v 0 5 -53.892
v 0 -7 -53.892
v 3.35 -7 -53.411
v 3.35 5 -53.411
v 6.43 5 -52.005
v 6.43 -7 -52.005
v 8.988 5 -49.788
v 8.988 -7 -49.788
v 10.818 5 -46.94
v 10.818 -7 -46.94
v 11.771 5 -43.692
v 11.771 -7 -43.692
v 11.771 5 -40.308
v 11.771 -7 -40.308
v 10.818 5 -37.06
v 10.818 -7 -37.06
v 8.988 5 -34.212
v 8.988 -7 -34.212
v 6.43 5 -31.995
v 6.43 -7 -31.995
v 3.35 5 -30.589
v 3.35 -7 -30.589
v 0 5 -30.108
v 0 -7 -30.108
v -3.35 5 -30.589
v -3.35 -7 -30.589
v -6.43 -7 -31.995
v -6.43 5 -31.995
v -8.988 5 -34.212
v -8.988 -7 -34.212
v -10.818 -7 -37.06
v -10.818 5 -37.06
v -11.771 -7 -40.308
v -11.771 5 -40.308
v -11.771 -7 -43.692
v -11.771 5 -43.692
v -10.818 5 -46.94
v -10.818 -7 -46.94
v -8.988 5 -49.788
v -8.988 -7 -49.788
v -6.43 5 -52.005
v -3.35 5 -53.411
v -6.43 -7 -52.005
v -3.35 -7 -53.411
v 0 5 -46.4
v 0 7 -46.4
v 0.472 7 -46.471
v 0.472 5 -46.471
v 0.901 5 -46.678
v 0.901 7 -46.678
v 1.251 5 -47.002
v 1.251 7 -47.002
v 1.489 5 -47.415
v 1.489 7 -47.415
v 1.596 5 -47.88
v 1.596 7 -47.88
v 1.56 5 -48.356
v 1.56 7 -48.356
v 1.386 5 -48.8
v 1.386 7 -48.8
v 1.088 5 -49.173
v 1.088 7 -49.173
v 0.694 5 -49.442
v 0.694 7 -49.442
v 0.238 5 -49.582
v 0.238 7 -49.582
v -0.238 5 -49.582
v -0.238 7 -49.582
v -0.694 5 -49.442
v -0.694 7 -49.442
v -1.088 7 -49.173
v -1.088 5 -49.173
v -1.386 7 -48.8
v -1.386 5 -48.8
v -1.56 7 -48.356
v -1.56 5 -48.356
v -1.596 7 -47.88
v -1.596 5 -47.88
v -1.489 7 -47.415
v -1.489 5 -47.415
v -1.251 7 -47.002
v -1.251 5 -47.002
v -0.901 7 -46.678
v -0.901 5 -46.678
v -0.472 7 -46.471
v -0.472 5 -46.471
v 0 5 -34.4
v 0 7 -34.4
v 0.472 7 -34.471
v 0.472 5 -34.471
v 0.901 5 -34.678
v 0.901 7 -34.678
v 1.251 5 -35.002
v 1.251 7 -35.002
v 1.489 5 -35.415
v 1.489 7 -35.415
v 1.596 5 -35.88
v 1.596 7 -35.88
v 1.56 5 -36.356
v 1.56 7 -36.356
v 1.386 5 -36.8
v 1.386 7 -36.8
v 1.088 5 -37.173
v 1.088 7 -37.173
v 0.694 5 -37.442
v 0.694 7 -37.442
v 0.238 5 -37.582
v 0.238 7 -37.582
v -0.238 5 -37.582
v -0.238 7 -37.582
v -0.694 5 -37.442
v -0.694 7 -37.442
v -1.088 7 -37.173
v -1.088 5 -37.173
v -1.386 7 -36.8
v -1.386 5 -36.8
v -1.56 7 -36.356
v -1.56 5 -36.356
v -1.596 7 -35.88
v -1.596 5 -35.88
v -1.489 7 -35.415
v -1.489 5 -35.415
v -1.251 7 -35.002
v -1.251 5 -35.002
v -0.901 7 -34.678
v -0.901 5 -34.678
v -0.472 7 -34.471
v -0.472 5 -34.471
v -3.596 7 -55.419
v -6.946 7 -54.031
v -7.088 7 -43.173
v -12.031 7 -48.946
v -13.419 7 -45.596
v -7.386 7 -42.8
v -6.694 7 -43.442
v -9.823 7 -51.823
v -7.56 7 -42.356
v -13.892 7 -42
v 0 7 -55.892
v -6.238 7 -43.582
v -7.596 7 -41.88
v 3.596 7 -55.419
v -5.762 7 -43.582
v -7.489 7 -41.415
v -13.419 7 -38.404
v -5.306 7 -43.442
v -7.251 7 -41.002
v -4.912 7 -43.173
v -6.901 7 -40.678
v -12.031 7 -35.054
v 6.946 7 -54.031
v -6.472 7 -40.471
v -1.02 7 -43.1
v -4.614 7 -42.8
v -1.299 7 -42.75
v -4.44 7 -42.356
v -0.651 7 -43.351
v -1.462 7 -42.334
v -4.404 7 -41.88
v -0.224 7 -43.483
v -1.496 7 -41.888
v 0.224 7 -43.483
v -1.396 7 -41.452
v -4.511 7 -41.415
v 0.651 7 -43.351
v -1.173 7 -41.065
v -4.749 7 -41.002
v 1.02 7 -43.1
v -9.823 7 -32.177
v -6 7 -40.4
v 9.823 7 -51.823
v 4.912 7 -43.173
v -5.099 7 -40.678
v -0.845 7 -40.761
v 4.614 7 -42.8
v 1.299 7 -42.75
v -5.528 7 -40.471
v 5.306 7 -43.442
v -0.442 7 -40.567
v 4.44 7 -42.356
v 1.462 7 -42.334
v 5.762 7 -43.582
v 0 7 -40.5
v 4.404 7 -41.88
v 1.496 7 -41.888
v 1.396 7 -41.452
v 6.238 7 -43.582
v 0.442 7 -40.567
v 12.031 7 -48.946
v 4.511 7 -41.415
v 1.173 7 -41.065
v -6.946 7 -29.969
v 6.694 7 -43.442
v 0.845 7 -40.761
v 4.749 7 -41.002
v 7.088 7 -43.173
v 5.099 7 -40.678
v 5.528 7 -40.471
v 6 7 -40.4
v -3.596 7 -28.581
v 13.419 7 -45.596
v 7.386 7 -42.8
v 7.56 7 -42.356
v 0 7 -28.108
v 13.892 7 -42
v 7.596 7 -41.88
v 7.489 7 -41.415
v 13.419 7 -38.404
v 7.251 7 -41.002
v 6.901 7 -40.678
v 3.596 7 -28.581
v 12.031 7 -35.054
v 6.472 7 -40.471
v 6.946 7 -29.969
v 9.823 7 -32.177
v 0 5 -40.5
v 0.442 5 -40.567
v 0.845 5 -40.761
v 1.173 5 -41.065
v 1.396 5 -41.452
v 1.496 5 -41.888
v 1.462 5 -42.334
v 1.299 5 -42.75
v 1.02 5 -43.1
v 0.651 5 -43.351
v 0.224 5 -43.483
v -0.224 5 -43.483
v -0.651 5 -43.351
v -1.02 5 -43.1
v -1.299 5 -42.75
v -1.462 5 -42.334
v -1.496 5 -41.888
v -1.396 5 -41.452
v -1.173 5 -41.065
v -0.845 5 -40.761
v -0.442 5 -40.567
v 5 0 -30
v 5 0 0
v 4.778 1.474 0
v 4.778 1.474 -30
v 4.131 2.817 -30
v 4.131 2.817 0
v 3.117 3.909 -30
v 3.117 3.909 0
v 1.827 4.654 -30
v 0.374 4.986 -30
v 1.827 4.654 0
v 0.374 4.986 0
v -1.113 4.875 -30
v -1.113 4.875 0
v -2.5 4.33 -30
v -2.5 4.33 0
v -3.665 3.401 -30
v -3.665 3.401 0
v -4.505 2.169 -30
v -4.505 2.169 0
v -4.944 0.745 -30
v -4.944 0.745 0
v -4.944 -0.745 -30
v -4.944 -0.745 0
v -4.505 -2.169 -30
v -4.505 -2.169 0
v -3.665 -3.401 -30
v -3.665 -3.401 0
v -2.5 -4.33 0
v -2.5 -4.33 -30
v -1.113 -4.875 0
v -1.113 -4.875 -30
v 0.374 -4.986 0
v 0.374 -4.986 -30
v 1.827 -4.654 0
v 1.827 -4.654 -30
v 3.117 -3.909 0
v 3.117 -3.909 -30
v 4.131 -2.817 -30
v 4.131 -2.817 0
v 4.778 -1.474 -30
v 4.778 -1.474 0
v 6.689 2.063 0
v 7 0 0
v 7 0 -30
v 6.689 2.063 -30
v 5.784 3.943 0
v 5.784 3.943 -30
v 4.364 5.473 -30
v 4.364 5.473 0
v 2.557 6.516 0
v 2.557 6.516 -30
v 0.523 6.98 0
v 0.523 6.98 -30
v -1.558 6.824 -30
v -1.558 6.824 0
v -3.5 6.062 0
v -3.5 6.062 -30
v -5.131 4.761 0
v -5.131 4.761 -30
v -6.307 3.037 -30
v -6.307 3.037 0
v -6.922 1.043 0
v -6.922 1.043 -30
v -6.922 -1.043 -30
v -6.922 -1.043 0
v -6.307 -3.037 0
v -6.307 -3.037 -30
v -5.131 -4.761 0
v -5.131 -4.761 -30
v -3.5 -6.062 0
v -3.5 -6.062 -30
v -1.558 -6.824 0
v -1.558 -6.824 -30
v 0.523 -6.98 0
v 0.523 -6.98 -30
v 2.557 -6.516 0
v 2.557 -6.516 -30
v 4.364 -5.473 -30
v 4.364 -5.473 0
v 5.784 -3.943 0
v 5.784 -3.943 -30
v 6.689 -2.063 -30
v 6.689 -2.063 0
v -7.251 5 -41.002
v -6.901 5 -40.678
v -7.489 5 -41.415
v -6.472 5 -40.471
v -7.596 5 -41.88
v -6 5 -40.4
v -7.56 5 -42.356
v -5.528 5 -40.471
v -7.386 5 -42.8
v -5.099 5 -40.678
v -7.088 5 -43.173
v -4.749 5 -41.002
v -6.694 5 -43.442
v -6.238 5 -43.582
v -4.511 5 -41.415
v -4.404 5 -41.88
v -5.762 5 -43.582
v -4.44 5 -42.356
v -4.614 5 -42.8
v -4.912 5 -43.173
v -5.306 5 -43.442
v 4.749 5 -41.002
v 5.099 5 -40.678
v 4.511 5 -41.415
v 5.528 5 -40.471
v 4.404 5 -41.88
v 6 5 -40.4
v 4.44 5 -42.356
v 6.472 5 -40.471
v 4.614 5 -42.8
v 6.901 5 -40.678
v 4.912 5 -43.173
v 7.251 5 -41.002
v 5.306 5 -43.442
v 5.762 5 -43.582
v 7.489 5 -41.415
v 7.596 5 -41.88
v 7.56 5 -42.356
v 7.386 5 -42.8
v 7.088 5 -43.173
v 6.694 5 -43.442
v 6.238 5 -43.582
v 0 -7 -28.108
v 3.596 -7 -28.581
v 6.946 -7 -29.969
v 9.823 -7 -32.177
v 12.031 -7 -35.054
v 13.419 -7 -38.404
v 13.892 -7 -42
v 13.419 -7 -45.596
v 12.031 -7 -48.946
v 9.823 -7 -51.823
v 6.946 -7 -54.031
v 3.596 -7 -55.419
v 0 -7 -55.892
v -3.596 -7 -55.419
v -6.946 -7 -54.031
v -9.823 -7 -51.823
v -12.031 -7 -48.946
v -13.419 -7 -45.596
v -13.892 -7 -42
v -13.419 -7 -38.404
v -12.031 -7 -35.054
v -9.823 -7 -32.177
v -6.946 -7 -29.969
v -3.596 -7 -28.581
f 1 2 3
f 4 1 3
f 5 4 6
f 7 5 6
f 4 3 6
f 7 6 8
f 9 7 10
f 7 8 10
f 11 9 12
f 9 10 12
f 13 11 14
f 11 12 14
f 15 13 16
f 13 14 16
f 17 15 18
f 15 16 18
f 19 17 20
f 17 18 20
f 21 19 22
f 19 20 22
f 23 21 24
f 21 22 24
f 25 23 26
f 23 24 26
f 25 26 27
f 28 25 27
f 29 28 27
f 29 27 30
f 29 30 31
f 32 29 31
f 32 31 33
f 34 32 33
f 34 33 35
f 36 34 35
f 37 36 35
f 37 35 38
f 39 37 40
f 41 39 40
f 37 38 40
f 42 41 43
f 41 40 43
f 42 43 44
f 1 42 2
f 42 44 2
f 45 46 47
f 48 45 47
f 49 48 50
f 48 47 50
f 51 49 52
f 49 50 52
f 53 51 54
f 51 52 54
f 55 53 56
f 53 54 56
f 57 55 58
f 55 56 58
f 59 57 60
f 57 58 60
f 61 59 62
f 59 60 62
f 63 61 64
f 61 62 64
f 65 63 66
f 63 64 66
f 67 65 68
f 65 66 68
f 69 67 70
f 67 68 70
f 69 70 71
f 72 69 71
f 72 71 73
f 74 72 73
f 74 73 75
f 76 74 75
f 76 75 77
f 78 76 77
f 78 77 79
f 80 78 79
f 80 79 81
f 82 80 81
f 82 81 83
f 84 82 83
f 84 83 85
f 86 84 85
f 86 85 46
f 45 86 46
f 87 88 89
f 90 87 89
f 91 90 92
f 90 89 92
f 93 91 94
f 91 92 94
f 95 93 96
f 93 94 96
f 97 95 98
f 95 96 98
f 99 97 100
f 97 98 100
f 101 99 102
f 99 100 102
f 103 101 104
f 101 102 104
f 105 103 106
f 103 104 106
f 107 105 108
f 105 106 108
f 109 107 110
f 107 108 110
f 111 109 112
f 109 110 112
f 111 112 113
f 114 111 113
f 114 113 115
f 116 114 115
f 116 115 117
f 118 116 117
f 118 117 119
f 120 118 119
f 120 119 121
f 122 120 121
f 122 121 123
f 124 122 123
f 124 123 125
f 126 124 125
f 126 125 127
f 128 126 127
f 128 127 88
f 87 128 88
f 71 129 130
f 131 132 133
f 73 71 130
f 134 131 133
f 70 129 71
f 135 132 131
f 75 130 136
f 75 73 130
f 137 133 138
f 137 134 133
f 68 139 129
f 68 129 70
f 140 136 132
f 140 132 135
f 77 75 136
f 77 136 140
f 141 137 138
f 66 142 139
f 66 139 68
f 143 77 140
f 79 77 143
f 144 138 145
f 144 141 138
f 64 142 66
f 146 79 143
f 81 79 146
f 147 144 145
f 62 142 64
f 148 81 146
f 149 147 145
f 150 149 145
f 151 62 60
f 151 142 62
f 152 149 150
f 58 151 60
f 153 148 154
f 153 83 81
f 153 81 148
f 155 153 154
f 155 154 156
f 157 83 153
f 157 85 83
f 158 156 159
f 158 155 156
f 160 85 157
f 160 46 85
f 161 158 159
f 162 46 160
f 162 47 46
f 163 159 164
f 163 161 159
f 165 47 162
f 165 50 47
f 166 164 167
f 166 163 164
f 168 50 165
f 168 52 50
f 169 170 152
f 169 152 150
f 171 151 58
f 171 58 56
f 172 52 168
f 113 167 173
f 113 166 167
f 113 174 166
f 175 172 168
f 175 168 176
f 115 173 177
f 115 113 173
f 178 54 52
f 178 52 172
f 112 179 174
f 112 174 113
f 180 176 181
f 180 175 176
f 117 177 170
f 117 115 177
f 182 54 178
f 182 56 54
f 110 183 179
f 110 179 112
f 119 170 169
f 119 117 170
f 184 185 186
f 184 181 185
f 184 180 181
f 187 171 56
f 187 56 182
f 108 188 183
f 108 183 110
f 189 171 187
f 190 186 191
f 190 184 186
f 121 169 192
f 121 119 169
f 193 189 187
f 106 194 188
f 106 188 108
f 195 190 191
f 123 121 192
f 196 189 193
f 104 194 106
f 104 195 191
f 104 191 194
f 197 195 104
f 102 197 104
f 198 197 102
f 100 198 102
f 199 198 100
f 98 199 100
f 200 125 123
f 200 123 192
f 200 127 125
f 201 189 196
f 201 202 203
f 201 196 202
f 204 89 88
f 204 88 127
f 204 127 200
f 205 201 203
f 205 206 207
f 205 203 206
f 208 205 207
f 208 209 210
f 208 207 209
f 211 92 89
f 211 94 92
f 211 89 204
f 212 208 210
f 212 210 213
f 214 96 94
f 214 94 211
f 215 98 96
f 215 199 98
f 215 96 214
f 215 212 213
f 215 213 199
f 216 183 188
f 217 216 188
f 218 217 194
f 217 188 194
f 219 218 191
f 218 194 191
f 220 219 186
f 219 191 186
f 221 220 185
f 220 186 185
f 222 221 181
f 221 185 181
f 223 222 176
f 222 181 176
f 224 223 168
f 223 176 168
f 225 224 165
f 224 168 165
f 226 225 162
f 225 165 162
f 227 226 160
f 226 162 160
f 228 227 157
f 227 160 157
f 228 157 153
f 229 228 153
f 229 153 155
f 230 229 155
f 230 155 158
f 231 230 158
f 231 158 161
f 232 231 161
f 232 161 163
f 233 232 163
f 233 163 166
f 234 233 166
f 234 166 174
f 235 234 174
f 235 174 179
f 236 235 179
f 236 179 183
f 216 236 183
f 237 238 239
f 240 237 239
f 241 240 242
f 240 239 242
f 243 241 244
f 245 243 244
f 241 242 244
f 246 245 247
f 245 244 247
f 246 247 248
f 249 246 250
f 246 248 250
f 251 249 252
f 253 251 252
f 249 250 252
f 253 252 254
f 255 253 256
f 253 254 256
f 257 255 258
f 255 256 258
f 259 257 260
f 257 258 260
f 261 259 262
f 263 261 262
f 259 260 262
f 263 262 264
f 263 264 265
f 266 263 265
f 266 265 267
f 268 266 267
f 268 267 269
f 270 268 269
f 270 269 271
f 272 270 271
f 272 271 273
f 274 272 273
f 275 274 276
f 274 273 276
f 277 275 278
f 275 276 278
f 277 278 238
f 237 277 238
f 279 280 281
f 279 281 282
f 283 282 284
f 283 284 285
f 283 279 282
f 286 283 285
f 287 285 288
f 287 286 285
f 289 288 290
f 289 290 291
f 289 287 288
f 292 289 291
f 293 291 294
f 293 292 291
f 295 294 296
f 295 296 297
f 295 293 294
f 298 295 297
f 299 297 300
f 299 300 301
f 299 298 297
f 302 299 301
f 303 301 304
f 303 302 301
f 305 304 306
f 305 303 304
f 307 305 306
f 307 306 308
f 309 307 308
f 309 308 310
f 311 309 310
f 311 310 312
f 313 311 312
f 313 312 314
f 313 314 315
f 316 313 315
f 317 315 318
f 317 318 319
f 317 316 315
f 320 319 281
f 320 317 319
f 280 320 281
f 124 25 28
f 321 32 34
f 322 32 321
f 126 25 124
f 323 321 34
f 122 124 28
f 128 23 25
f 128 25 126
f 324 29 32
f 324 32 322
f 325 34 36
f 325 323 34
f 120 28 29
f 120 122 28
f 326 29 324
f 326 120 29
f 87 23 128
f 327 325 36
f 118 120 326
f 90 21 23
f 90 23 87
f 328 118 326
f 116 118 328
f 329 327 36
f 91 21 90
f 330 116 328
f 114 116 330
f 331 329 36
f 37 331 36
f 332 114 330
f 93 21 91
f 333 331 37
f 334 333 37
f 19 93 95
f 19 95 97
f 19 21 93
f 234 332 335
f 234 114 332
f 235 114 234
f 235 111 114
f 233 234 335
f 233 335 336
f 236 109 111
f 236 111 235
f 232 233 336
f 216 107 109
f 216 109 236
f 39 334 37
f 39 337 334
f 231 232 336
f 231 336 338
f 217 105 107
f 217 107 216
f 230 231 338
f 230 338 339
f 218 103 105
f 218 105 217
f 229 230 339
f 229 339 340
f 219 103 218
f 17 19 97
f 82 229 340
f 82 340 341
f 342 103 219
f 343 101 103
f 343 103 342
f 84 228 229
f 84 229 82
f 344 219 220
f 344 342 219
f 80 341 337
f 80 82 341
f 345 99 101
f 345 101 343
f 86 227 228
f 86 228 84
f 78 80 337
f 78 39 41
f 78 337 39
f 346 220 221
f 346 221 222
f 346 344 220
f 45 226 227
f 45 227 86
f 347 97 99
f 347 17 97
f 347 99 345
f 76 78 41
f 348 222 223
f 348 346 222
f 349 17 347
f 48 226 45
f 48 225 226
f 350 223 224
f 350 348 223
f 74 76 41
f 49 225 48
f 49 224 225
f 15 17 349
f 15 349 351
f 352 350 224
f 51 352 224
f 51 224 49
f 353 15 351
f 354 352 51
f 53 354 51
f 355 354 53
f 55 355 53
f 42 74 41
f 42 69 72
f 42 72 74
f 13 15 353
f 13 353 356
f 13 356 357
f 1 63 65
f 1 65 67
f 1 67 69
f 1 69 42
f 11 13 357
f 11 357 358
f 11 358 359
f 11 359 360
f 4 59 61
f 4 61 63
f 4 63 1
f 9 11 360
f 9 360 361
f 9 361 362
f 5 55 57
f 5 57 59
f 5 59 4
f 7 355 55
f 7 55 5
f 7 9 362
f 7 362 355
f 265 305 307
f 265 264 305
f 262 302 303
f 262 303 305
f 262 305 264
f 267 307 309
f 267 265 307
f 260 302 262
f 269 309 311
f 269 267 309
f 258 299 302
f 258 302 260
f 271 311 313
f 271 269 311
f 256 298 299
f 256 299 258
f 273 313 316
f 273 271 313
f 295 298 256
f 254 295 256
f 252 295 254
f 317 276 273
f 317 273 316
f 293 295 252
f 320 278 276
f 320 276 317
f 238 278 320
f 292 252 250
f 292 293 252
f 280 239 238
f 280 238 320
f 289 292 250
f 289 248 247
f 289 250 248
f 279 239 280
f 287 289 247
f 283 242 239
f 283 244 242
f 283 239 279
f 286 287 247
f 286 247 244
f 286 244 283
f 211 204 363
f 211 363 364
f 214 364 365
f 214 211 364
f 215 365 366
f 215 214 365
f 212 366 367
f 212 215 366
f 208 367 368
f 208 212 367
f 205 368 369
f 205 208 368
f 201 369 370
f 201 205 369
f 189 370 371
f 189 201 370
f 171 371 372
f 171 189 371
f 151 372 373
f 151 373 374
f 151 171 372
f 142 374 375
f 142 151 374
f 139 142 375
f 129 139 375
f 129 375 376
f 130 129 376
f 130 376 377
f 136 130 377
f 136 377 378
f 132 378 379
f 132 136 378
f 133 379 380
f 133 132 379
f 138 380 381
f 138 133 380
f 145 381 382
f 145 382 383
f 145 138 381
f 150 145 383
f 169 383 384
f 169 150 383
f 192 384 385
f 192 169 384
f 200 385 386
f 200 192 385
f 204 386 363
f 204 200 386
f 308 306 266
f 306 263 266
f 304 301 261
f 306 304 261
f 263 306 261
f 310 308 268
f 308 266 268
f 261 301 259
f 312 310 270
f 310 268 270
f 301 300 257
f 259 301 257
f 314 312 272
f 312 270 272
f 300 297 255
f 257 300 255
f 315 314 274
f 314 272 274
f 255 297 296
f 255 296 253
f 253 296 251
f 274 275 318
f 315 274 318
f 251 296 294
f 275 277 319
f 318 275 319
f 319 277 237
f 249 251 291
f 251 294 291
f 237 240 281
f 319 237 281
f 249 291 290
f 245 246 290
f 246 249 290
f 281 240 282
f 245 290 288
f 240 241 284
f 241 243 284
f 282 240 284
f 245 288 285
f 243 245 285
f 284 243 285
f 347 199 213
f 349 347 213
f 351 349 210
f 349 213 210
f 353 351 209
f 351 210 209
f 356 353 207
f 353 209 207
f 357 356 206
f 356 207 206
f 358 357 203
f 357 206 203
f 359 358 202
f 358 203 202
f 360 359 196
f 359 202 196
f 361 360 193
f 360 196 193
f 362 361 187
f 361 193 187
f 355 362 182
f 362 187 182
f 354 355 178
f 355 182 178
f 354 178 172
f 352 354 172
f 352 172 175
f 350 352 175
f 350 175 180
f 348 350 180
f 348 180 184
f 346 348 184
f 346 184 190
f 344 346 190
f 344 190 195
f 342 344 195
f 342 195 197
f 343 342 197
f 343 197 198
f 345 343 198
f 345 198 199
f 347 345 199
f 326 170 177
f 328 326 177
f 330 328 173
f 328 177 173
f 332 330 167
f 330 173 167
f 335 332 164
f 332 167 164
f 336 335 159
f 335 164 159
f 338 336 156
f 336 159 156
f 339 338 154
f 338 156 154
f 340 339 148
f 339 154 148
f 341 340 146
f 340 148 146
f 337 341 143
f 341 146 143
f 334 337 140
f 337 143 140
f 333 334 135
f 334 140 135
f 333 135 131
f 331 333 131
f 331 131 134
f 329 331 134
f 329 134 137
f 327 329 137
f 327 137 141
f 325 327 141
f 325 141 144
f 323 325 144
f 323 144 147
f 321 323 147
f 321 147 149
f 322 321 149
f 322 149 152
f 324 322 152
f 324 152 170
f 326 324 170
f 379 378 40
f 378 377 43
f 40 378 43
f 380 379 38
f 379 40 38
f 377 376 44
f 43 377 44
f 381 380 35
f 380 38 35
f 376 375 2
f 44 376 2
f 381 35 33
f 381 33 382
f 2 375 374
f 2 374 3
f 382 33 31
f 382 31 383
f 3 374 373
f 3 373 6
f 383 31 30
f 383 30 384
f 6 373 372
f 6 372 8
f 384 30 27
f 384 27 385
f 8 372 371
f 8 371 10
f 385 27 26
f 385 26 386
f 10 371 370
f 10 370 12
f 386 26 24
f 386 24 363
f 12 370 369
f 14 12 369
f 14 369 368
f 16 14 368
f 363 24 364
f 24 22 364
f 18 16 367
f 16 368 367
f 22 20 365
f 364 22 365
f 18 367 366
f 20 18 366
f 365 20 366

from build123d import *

# Parameters (mm, degrees)
SKETCH1_R           = 7
SKETCH1_R_2         = 5
BOSS_EXTRUDE1_DEPTH = 30
BOSS_EXTRUDE2_START = 7
SKETCH3_R           = 13.892443989
SKETCH3_R_2         = 1.5
SKETCH3_R_3         = 1.6
BOSS_EXTRUDE2_DEPTH = 14
SKETCH4_R           = 11.892443989
CUT_EXTRUDE1_DEPTH  = 12


with BuildPart() as part:
    # Sketch1 → Boss-Extrude1 (new body)
    with BuildSketch(Plane.XY):
        Circle(SKETCH1_R)
        Circle(SKETCH1_R_2, mode=Mode.SUBTRACT)
    extrude(amount=-BOSS_EXTRUDE1_DEPTH)


with BuildPart() as body_2:
    # Sketch3 → Boss-Extrude2 (new body)
    with BuildSketch(Plane(origin=(0, 0, 0), x_dir=(1, 0, 0), z_dir=(0, 1, 0)).offset(BOSS_EXTRUDE2_START)):
        with Locations(Location((0, 42, 0), (0, 0, 270))):
            Circle(SKETCH3_R)
        with Locations(Location((0, 42, 0), (0, 0, 270))):
            Circle(SKETCH3_R_2, mode=Mode.SUBTRACT)
        with Locations(Location((0, 36, 0), (0, 0, 270))):
            Circle(SKETCH3_R_3, mode=Mode.SUBTRACT)
        with Locations(Location((-6, 42, 0), (0, 0, 270))):
            Circle(SKETCH3_R_3, mode=Mode.SUBTRACT)
        with Locations(Location((6, 42, 0), (0, 0, 270))):
            Circle(SKETCH3_R_3, mode=Mode.SUBTRACT)
        with Locations(Location((0, 48, 0), (0, 0, 270))):
            Circle(SKETCH3_R_3, mode=Mode.SUBTRACT)
    extrude(amount=-BOSS_EXTRUDE2_DEPTH)

    # Sketch4 → Cut-Extrude1 (cut)
    with BuildSketch(Plane.XZ.offset(7)):
        with Locations(Location((0, -42, 0), (0, 0, 270))):
            Circle(SKETCH4_R)
    extrude(amount=-CUT_EXTRUDE1_DEPTH, mode=Mode.SUBTRACT)


solid = Compound([part.part, body_2.part])
